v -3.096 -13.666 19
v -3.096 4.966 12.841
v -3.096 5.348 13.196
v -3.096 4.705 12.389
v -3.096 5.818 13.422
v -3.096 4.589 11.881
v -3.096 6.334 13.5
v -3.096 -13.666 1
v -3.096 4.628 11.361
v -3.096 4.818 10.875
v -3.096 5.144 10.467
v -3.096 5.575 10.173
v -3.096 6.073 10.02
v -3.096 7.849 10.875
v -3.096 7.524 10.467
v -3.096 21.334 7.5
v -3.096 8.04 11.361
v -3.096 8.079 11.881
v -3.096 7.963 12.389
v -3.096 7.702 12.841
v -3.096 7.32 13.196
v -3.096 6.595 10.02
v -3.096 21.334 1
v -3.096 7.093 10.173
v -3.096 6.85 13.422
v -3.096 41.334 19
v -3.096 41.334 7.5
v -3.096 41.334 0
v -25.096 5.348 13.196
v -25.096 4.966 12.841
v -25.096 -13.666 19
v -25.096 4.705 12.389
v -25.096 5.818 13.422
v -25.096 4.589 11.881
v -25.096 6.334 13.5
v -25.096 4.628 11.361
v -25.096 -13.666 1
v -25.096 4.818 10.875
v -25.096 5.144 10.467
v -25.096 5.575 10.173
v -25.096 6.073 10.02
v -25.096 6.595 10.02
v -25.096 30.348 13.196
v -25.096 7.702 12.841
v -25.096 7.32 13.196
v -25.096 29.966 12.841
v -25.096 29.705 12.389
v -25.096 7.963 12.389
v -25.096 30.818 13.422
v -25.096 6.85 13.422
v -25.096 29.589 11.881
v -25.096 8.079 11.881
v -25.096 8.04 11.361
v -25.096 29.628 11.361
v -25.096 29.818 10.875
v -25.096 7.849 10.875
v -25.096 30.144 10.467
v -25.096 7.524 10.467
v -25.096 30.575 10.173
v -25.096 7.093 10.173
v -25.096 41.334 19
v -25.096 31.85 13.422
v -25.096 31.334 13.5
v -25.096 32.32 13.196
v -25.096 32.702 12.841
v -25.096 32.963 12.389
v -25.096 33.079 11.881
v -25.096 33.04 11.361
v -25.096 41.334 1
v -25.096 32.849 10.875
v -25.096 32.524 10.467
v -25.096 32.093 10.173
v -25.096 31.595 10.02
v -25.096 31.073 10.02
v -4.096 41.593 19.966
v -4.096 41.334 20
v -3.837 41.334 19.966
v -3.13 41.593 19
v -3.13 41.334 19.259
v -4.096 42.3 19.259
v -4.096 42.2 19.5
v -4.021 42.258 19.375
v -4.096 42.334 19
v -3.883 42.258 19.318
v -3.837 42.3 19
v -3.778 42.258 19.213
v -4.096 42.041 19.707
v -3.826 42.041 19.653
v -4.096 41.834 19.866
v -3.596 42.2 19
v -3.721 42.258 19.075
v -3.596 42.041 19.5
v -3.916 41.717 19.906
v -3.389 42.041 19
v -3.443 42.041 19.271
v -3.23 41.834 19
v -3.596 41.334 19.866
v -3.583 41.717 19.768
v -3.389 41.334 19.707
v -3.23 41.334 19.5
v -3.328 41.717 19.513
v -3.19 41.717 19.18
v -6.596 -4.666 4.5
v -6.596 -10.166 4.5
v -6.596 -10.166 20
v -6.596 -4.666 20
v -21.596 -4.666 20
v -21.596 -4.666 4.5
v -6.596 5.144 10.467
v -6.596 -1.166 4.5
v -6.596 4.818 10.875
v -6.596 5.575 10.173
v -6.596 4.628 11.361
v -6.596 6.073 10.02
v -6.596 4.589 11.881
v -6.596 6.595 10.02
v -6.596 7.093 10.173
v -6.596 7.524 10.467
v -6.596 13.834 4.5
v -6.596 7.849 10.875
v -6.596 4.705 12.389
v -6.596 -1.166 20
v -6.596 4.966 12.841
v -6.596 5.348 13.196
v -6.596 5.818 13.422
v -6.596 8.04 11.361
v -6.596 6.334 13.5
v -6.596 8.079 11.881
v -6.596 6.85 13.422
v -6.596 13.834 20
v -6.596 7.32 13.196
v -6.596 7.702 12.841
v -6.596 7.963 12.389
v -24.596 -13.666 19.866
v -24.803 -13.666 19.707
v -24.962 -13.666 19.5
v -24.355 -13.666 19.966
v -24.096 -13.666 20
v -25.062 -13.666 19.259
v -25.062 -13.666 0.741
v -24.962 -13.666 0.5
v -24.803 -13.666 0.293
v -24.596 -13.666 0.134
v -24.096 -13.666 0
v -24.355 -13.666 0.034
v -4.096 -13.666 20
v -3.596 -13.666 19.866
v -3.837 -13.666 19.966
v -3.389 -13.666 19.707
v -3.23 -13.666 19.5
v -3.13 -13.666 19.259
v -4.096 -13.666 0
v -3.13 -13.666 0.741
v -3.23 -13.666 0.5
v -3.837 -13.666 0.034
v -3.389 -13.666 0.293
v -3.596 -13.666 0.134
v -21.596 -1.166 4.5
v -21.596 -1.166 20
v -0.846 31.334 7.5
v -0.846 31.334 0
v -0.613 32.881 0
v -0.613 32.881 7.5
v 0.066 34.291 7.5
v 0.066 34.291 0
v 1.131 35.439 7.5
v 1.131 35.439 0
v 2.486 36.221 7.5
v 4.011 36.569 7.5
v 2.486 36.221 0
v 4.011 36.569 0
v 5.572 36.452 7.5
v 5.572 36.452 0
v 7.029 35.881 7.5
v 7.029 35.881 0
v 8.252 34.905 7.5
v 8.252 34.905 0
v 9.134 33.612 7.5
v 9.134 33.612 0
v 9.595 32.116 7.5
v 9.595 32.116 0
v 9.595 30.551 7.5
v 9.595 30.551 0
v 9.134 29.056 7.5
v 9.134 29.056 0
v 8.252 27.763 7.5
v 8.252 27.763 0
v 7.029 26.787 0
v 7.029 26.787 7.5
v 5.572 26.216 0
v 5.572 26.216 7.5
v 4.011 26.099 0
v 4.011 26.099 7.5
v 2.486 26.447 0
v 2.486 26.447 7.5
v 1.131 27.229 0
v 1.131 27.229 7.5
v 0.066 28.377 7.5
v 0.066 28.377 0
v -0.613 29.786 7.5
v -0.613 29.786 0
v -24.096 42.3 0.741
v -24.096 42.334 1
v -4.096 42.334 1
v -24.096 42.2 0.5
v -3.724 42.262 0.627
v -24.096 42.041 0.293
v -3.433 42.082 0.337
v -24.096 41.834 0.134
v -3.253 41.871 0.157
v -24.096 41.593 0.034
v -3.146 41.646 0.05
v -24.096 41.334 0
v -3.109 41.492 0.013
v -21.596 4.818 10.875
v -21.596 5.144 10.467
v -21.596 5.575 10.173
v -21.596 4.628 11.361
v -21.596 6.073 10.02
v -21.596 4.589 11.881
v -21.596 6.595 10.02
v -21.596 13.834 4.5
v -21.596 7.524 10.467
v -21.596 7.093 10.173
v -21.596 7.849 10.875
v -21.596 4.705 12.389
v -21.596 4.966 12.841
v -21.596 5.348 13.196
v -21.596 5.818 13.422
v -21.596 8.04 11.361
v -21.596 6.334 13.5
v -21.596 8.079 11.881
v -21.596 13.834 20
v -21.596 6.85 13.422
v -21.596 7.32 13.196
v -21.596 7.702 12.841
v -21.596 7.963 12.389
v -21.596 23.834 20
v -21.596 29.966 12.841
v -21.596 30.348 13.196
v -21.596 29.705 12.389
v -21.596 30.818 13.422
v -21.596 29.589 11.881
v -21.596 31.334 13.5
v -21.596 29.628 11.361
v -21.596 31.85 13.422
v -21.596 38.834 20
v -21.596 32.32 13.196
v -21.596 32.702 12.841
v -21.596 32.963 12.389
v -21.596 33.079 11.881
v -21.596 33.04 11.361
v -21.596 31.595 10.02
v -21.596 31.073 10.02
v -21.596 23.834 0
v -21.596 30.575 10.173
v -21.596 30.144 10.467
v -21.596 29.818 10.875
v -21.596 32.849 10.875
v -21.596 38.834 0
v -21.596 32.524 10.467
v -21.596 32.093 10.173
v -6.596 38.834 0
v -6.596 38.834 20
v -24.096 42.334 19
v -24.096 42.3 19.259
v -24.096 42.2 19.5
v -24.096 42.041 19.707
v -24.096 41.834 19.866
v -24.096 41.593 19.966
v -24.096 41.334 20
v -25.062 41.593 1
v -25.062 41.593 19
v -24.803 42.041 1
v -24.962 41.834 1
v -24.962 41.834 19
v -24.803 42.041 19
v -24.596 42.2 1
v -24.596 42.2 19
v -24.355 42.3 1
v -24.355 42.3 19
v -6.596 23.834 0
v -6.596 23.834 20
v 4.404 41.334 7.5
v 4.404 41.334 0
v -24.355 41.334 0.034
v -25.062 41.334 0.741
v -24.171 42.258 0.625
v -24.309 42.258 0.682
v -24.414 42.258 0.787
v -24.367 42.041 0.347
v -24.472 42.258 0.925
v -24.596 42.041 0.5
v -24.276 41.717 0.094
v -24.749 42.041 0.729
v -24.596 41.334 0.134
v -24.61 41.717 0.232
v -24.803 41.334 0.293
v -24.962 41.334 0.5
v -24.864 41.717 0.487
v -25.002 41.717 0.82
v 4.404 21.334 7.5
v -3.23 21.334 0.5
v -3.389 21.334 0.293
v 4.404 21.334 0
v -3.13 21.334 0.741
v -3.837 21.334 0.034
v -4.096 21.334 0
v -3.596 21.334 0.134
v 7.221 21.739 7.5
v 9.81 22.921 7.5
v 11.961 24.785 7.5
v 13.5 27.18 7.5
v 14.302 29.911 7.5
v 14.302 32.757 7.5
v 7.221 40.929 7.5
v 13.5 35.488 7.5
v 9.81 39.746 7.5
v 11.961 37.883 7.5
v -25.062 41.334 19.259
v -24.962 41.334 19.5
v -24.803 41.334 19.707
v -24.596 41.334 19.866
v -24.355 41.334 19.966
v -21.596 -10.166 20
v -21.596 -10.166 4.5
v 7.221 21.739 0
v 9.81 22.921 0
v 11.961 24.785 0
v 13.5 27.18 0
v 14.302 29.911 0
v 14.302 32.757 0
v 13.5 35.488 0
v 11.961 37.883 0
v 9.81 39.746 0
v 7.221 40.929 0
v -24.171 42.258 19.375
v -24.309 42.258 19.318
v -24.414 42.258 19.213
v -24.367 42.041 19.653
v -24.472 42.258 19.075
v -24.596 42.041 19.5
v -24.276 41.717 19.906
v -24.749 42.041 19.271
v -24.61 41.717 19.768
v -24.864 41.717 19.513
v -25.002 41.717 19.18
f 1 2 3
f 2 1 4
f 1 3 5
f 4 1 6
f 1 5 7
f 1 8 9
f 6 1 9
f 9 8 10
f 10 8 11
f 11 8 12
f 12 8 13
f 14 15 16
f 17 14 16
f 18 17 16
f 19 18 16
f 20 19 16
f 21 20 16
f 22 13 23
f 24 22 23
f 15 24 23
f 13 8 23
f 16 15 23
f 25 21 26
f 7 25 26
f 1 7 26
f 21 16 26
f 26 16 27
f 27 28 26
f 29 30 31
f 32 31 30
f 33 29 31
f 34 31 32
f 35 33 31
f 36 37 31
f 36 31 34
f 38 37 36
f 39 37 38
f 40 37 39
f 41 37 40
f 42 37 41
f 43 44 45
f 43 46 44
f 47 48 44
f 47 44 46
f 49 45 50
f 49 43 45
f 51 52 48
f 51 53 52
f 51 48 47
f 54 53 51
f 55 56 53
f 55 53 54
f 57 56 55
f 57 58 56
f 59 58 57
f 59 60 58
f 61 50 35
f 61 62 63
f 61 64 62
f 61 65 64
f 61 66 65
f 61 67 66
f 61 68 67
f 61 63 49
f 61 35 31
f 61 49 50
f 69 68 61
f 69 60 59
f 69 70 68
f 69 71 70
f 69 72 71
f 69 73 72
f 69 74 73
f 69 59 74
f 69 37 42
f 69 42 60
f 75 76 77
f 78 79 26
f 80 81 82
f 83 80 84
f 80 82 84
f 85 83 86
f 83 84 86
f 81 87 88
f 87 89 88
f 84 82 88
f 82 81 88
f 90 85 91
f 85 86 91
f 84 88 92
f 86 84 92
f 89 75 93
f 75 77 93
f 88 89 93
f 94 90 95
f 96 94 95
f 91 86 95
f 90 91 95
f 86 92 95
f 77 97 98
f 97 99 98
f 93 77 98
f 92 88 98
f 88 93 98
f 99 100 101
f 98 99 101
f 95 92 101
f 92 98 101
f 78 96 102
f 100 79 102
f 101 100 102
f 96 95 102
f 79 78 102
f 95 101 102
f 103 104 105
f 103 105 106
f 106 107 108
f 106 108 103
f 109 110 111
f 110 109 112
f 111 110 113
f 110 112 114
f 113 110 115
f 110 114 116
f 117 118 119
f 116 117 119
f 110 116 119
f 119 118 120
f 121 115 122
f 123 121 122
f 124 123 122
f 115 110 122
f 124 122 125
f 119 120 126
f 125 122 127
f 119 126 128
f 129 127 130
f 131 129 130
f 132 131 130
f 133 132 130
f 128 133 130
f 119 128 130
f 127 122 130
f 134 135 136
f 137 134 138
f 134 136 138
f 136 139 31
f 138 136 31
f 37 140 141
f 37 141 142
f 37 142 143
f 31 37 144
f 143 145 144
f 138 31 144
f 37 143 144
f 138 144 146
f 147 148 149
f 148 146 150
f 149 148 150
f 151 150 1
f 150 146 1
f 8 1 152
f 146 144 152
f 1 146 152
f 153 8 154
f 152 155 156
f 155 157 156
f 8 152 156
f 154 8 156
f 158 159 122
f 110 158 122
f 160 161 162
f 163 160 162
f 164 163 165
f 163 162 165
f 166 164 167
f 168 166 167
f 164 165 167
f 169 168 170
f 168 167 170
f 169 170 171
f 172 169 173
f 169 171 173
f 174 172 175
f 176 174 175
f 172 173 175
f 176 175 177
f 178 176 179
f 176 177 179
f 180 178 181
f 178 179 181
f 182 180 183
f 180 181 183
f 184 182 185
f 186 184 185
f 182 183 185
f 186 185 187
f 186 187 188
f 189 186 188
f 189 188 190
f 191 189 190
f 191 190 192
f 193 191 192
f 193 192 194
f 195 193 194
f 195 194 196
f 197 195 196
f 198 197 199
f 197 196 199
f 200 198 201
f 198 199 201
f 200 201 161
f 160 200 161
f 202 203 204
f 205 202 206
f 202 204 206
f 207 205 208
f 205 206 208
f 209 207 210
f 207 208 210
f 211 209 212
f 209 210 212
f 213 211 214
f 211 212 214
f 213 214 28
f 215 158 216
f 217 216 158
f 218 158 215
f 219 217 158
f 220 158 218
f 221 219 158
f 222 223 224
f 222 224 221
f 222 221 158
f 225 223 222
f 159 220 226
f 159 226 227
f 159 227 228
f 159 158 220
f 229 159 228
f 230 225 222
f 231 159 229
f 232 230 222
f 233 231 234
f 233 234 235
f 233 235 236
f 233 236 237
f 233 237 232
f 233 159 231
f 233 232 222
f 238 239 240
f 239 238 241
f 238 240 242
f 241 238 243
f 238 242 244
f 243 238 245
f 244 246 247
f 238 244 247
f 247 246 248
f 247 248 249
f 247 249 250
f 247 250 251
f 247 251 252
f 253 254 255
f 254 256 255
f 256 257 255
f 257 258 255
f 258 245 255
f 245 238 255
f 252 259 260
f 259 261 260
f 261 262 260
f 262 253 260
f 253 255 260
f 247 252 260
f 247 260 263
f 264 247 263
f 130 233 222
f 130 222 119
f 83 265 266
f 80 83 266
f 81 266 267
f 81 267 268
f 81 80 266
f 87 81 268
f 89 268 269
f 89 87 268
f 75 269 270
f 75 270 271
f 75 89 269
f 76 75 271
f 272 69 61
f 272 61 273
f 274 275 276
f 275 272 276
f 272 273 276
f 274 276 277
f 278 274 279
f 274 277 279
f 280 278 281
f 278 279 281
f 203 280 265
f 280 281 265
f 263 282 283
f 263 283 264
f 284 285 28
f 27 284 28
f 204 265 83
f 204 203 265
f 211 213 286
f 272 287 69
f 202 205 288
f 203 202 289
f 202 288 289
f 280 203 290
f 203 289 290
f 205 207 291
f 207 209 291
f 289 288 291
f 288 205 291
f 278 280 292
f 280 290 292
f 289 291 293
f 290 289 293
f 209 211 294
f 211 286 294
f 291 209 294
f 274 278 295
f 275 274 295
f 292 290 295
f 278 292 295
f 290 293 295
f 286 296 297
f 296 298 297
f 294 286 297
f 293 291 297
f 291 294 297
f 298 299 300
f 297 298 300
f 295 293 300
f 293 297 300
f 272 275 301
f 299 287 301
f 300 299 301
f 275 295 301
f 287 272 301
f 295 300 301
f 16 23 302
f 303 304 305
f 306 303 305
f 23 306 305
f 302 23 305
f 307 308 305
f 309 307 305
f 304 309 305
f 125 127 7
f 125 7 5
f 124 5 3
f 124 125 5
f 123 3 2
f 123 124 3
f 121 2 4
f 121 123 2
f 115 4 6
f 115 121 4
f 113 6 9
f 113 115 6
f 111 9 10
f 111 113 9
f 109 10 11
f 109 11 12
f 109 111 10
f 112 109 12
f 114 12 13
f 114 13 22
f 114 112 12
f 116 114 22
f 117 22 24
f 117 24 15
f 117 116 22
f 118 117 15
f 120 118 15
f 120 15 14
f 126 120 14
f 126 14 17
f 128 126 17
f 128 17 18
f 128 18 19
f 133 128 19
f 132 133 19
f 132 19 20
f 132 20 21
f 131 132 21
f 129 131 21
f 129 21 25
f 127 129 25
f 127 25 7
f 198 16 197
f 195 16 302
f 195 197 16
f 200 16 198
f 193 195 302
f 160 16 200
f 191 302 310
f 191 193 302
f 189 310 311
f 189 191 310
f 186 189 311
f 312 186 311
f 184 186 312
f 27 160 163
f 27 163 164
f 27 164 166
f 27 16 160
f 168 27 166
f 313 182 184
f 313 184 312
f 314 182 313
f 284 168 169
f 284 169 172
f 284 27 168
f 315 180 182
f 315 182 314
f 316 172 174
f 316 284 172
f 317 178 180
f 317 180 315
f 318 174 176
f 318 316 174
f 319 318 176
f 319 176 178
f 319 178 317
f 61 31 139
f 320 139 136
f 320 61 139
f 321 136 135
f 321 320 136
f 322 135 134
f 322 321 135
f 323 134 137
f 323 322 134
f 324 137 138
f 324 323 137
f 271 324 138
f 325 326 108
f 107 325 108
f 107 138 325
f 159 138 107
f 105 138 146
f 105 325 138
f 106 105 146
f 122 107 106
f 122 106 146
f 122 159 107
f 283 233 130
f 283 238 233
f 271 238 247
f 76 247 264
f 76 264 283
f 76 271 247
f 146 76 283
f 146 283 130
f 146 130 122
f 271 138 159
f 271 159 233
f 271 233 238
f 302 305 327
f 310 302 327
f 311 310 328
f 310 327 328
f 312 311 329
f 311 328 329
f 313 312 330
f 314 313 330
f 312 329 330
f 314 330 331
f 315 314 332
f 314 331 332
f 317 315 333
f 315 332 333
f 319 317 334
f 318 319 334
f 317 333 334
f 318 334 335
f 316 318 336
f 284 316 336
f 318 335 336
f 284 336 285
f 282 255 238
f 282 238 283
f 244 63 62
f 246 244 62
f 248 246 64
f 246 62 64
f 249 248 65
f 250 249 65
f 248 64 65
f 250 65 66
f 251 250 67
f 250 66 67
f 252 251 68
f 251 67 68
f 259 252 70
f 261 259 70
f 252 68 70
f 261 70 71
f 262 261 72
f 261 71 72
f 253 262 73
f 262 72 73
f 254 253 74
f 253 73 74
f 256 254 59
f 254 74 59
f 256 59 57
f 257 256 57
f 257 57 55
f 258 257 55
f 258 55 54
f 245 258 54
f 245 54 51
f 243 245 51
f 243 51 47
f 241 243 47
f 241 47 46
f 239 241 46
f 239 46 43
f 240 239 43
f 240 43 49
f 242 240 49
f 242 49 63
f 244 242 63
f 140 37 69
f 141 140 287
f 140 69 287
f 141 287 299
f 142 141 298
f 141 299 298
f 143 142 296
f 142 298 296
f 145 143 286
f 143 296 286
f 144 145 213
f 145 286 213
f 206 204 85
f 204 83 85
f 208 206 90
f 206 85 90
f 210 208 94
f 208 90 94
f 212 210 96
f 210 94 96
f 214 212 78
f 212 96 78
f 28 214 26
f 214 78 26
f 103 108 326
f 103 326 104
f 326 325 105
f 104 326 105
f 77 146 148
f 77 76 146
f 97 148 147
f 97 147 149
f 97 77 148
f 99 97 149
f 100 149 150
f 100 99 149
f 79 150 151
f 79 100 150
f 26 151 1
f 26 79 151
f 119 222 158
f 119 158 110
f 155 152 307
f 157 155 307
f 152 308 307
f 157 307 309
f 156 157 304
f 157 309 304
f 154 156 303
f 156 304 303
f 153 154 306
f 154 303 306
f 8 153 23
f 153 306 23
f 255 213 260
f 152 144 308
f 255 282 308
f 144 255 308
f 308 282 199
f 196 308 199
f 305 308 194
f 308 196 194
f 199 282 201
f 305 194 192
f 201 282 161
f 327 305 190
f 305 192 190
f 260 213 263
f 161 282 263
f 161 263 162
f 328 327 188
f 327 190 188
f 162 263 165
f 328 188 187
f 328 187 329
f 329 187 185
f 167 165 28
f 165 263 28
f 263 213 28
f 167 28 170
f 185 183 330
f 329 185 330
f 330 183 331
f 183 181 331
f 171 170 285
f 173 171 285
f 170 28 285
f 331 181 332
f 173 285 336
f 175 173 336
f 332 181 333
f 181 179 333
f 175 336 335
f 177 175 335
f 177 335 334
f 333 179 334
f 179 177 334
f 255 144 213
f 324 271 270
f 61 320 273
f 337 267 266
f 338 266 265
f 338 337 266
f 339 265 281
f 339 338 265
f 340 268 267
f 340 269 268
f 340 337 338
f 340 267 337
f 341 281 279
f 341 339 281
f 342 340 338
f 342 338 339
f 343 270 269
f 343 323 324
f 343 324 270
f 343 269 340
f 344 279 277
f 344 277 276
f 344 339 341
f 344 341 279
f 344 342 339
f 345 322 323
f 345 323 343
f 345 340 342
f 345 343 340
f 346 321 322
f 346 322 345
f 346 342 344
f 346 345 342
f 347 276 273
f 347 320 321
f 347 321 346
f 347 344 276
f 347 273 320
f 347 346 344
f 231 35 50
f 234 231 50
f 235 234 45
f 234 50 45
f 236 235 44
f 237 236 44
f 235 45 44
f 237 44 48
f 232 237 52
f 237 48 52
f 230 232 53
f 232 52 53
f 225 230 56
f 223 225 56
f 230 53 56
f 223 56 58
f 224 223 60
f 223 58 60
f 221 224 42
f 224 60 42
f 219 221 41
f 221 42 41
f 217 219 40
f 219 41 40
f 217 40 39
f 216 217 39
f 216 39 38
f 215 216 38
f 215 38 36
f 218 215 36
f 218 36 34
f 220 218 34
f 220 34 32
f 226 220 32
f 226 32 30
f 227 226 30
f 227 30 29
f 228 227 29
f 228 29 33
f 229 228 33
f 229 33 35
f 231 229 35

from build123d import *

# Parameters (mm, degrees)
SKETCH1_W           = 22
SKETCH1_H           = 56
SKETCH1_W_2         = 15
SKETCH1_H_2         = 15
BOSS_EXTRUDE1_DEPTH = 20
SKETCH2_W           = 15
SKETCH2_H           = 15
SKETCH2_H_2         = 5.5
CUT_EXTRUDE1_DEPTH  = 15.5
SKETCH4_R           = 5.25
BOSS_EXTRUDE3_DEPTH = 7.5
FILLET4_R           = 1
SKETCH6_R           = 1.75
CUT_EXTRUDE2_DEPTH  = 10
CUT_EXTRUDE3_START  = -10
SKETCH7_R           = 1.75
CUT_EXTRUDE3_DEPTH  = 10


with BuildPart() as part:
    # Sketch1 → Boss-Extrude1 (new body)
    with BuildSketch(Plane.XY):
        with Locations((-14.096172604, 14.333947726)):
            Rectangle(SKETCH1_W, SKETCH1_H)
        with Locations((-14.096172604, 31.333947726)):
            Rectangle(SKETCH1_W_2, SKETCH1_H_2, mode=Mode.SUBTRACT)
    extrude(amount=BOSS_EXTRUDE1_DEPTH)

    # Sketch2 → Cut-Extrude1 (cut)
    with BuildSketch(Plane.XY.offset(20)):
        with Locations((-14.096172604, 6.333947726)):
            Rectangle(SKETCH2_W, SKETCH2_H)
        with Locations((-14.096172604, -7.416052274)):
            Rectangle(SKETCH2_W, SKETCH2_H_2)
    extrude(amount=-CUT_EXTRUDE1_DEPTH, mode=Mode.SUBTRACT)

    # Sketch4 → Boss-Extrude3 (add)
    with BuildSketch(Plane(origin=(0, 0, 0), x_dir=(-1, 0, 0), z_dir=(0, 0, -1))):
        with BuildLine():
            Line((-4.403827396, 41.333947726), (3.096172604, 41.333947726))
            Line((3.096172604, 41.333947726), (3.096172604, 21.333947726))
            Line((3.096172604, 21.333947726), (-4.403827396, 21.333947726))
            ThreePointArc((-4.403827396, 21.333947726), (-14.403827396, 31.333947726), (-4.403827396, 41.333947726))
        make_face()
        with Locations((-4.403827396, 31.333947726)):
            Circle(SKETCH4_R, mode=Mode.SUBTRACT)
    extrude(amount=-BOSS_EXTRUDE3_DEPTH)

    # Fillet4
    fillet4_edges = [part.edges().sort_by_distance(p)[0] for p in [
        (-3.096172604, 14.333947726, 20),
        (-25.096172604, 14.333947726, 0),
        (-25.096172604, 14.333947726, 20),
        (-14.096172604, 42.333947726, 20),
        (-3.096172604, 42.333947726, 10),
        (-14.096172604, 42.333947726, 0),
        (-25.096172604, 42.333947726, 10),
        (-3.096172604, 3.833947726, 0),
    ]]
    fillet(fillet4_edges, radius=FILLET4_R - 0.0001)  # a hair under: the kernel refuses the full size

    # Sketch6 → Cut-Extrude2 (cut)
    with BuildSketch(Plane.ZY.offset(25.096172604)):
        with Locations((11.75, 31.333947726)):
            Circle(SKETCH6_R)
        with Locations((11.75, 6.333947726)):
            Circle(SKETCH6_R)
    extrude(amount=-CUT_EXTRUDE2_DEPTH, mode=Mode.SUBTRACT)

    # Sketch7 → Cut-Extrude3 (cut)
    with BuildSketch(Plane(origin=(-3.096172604, 0, 0), x_dir=(0, 0, -1), z_dir=(1, 0, 0)).offset(CUT_EXTRUDE3_START)):
        with Locations(Location((-11.75, 6.333947726, 0), (0, 0, 180))):
            Circle(SKETCH7_R)
    extrude(amount=CUT_EXTRUDE3_DEPTH, mode=Mode.SUBTRACT)


solid = part.part
